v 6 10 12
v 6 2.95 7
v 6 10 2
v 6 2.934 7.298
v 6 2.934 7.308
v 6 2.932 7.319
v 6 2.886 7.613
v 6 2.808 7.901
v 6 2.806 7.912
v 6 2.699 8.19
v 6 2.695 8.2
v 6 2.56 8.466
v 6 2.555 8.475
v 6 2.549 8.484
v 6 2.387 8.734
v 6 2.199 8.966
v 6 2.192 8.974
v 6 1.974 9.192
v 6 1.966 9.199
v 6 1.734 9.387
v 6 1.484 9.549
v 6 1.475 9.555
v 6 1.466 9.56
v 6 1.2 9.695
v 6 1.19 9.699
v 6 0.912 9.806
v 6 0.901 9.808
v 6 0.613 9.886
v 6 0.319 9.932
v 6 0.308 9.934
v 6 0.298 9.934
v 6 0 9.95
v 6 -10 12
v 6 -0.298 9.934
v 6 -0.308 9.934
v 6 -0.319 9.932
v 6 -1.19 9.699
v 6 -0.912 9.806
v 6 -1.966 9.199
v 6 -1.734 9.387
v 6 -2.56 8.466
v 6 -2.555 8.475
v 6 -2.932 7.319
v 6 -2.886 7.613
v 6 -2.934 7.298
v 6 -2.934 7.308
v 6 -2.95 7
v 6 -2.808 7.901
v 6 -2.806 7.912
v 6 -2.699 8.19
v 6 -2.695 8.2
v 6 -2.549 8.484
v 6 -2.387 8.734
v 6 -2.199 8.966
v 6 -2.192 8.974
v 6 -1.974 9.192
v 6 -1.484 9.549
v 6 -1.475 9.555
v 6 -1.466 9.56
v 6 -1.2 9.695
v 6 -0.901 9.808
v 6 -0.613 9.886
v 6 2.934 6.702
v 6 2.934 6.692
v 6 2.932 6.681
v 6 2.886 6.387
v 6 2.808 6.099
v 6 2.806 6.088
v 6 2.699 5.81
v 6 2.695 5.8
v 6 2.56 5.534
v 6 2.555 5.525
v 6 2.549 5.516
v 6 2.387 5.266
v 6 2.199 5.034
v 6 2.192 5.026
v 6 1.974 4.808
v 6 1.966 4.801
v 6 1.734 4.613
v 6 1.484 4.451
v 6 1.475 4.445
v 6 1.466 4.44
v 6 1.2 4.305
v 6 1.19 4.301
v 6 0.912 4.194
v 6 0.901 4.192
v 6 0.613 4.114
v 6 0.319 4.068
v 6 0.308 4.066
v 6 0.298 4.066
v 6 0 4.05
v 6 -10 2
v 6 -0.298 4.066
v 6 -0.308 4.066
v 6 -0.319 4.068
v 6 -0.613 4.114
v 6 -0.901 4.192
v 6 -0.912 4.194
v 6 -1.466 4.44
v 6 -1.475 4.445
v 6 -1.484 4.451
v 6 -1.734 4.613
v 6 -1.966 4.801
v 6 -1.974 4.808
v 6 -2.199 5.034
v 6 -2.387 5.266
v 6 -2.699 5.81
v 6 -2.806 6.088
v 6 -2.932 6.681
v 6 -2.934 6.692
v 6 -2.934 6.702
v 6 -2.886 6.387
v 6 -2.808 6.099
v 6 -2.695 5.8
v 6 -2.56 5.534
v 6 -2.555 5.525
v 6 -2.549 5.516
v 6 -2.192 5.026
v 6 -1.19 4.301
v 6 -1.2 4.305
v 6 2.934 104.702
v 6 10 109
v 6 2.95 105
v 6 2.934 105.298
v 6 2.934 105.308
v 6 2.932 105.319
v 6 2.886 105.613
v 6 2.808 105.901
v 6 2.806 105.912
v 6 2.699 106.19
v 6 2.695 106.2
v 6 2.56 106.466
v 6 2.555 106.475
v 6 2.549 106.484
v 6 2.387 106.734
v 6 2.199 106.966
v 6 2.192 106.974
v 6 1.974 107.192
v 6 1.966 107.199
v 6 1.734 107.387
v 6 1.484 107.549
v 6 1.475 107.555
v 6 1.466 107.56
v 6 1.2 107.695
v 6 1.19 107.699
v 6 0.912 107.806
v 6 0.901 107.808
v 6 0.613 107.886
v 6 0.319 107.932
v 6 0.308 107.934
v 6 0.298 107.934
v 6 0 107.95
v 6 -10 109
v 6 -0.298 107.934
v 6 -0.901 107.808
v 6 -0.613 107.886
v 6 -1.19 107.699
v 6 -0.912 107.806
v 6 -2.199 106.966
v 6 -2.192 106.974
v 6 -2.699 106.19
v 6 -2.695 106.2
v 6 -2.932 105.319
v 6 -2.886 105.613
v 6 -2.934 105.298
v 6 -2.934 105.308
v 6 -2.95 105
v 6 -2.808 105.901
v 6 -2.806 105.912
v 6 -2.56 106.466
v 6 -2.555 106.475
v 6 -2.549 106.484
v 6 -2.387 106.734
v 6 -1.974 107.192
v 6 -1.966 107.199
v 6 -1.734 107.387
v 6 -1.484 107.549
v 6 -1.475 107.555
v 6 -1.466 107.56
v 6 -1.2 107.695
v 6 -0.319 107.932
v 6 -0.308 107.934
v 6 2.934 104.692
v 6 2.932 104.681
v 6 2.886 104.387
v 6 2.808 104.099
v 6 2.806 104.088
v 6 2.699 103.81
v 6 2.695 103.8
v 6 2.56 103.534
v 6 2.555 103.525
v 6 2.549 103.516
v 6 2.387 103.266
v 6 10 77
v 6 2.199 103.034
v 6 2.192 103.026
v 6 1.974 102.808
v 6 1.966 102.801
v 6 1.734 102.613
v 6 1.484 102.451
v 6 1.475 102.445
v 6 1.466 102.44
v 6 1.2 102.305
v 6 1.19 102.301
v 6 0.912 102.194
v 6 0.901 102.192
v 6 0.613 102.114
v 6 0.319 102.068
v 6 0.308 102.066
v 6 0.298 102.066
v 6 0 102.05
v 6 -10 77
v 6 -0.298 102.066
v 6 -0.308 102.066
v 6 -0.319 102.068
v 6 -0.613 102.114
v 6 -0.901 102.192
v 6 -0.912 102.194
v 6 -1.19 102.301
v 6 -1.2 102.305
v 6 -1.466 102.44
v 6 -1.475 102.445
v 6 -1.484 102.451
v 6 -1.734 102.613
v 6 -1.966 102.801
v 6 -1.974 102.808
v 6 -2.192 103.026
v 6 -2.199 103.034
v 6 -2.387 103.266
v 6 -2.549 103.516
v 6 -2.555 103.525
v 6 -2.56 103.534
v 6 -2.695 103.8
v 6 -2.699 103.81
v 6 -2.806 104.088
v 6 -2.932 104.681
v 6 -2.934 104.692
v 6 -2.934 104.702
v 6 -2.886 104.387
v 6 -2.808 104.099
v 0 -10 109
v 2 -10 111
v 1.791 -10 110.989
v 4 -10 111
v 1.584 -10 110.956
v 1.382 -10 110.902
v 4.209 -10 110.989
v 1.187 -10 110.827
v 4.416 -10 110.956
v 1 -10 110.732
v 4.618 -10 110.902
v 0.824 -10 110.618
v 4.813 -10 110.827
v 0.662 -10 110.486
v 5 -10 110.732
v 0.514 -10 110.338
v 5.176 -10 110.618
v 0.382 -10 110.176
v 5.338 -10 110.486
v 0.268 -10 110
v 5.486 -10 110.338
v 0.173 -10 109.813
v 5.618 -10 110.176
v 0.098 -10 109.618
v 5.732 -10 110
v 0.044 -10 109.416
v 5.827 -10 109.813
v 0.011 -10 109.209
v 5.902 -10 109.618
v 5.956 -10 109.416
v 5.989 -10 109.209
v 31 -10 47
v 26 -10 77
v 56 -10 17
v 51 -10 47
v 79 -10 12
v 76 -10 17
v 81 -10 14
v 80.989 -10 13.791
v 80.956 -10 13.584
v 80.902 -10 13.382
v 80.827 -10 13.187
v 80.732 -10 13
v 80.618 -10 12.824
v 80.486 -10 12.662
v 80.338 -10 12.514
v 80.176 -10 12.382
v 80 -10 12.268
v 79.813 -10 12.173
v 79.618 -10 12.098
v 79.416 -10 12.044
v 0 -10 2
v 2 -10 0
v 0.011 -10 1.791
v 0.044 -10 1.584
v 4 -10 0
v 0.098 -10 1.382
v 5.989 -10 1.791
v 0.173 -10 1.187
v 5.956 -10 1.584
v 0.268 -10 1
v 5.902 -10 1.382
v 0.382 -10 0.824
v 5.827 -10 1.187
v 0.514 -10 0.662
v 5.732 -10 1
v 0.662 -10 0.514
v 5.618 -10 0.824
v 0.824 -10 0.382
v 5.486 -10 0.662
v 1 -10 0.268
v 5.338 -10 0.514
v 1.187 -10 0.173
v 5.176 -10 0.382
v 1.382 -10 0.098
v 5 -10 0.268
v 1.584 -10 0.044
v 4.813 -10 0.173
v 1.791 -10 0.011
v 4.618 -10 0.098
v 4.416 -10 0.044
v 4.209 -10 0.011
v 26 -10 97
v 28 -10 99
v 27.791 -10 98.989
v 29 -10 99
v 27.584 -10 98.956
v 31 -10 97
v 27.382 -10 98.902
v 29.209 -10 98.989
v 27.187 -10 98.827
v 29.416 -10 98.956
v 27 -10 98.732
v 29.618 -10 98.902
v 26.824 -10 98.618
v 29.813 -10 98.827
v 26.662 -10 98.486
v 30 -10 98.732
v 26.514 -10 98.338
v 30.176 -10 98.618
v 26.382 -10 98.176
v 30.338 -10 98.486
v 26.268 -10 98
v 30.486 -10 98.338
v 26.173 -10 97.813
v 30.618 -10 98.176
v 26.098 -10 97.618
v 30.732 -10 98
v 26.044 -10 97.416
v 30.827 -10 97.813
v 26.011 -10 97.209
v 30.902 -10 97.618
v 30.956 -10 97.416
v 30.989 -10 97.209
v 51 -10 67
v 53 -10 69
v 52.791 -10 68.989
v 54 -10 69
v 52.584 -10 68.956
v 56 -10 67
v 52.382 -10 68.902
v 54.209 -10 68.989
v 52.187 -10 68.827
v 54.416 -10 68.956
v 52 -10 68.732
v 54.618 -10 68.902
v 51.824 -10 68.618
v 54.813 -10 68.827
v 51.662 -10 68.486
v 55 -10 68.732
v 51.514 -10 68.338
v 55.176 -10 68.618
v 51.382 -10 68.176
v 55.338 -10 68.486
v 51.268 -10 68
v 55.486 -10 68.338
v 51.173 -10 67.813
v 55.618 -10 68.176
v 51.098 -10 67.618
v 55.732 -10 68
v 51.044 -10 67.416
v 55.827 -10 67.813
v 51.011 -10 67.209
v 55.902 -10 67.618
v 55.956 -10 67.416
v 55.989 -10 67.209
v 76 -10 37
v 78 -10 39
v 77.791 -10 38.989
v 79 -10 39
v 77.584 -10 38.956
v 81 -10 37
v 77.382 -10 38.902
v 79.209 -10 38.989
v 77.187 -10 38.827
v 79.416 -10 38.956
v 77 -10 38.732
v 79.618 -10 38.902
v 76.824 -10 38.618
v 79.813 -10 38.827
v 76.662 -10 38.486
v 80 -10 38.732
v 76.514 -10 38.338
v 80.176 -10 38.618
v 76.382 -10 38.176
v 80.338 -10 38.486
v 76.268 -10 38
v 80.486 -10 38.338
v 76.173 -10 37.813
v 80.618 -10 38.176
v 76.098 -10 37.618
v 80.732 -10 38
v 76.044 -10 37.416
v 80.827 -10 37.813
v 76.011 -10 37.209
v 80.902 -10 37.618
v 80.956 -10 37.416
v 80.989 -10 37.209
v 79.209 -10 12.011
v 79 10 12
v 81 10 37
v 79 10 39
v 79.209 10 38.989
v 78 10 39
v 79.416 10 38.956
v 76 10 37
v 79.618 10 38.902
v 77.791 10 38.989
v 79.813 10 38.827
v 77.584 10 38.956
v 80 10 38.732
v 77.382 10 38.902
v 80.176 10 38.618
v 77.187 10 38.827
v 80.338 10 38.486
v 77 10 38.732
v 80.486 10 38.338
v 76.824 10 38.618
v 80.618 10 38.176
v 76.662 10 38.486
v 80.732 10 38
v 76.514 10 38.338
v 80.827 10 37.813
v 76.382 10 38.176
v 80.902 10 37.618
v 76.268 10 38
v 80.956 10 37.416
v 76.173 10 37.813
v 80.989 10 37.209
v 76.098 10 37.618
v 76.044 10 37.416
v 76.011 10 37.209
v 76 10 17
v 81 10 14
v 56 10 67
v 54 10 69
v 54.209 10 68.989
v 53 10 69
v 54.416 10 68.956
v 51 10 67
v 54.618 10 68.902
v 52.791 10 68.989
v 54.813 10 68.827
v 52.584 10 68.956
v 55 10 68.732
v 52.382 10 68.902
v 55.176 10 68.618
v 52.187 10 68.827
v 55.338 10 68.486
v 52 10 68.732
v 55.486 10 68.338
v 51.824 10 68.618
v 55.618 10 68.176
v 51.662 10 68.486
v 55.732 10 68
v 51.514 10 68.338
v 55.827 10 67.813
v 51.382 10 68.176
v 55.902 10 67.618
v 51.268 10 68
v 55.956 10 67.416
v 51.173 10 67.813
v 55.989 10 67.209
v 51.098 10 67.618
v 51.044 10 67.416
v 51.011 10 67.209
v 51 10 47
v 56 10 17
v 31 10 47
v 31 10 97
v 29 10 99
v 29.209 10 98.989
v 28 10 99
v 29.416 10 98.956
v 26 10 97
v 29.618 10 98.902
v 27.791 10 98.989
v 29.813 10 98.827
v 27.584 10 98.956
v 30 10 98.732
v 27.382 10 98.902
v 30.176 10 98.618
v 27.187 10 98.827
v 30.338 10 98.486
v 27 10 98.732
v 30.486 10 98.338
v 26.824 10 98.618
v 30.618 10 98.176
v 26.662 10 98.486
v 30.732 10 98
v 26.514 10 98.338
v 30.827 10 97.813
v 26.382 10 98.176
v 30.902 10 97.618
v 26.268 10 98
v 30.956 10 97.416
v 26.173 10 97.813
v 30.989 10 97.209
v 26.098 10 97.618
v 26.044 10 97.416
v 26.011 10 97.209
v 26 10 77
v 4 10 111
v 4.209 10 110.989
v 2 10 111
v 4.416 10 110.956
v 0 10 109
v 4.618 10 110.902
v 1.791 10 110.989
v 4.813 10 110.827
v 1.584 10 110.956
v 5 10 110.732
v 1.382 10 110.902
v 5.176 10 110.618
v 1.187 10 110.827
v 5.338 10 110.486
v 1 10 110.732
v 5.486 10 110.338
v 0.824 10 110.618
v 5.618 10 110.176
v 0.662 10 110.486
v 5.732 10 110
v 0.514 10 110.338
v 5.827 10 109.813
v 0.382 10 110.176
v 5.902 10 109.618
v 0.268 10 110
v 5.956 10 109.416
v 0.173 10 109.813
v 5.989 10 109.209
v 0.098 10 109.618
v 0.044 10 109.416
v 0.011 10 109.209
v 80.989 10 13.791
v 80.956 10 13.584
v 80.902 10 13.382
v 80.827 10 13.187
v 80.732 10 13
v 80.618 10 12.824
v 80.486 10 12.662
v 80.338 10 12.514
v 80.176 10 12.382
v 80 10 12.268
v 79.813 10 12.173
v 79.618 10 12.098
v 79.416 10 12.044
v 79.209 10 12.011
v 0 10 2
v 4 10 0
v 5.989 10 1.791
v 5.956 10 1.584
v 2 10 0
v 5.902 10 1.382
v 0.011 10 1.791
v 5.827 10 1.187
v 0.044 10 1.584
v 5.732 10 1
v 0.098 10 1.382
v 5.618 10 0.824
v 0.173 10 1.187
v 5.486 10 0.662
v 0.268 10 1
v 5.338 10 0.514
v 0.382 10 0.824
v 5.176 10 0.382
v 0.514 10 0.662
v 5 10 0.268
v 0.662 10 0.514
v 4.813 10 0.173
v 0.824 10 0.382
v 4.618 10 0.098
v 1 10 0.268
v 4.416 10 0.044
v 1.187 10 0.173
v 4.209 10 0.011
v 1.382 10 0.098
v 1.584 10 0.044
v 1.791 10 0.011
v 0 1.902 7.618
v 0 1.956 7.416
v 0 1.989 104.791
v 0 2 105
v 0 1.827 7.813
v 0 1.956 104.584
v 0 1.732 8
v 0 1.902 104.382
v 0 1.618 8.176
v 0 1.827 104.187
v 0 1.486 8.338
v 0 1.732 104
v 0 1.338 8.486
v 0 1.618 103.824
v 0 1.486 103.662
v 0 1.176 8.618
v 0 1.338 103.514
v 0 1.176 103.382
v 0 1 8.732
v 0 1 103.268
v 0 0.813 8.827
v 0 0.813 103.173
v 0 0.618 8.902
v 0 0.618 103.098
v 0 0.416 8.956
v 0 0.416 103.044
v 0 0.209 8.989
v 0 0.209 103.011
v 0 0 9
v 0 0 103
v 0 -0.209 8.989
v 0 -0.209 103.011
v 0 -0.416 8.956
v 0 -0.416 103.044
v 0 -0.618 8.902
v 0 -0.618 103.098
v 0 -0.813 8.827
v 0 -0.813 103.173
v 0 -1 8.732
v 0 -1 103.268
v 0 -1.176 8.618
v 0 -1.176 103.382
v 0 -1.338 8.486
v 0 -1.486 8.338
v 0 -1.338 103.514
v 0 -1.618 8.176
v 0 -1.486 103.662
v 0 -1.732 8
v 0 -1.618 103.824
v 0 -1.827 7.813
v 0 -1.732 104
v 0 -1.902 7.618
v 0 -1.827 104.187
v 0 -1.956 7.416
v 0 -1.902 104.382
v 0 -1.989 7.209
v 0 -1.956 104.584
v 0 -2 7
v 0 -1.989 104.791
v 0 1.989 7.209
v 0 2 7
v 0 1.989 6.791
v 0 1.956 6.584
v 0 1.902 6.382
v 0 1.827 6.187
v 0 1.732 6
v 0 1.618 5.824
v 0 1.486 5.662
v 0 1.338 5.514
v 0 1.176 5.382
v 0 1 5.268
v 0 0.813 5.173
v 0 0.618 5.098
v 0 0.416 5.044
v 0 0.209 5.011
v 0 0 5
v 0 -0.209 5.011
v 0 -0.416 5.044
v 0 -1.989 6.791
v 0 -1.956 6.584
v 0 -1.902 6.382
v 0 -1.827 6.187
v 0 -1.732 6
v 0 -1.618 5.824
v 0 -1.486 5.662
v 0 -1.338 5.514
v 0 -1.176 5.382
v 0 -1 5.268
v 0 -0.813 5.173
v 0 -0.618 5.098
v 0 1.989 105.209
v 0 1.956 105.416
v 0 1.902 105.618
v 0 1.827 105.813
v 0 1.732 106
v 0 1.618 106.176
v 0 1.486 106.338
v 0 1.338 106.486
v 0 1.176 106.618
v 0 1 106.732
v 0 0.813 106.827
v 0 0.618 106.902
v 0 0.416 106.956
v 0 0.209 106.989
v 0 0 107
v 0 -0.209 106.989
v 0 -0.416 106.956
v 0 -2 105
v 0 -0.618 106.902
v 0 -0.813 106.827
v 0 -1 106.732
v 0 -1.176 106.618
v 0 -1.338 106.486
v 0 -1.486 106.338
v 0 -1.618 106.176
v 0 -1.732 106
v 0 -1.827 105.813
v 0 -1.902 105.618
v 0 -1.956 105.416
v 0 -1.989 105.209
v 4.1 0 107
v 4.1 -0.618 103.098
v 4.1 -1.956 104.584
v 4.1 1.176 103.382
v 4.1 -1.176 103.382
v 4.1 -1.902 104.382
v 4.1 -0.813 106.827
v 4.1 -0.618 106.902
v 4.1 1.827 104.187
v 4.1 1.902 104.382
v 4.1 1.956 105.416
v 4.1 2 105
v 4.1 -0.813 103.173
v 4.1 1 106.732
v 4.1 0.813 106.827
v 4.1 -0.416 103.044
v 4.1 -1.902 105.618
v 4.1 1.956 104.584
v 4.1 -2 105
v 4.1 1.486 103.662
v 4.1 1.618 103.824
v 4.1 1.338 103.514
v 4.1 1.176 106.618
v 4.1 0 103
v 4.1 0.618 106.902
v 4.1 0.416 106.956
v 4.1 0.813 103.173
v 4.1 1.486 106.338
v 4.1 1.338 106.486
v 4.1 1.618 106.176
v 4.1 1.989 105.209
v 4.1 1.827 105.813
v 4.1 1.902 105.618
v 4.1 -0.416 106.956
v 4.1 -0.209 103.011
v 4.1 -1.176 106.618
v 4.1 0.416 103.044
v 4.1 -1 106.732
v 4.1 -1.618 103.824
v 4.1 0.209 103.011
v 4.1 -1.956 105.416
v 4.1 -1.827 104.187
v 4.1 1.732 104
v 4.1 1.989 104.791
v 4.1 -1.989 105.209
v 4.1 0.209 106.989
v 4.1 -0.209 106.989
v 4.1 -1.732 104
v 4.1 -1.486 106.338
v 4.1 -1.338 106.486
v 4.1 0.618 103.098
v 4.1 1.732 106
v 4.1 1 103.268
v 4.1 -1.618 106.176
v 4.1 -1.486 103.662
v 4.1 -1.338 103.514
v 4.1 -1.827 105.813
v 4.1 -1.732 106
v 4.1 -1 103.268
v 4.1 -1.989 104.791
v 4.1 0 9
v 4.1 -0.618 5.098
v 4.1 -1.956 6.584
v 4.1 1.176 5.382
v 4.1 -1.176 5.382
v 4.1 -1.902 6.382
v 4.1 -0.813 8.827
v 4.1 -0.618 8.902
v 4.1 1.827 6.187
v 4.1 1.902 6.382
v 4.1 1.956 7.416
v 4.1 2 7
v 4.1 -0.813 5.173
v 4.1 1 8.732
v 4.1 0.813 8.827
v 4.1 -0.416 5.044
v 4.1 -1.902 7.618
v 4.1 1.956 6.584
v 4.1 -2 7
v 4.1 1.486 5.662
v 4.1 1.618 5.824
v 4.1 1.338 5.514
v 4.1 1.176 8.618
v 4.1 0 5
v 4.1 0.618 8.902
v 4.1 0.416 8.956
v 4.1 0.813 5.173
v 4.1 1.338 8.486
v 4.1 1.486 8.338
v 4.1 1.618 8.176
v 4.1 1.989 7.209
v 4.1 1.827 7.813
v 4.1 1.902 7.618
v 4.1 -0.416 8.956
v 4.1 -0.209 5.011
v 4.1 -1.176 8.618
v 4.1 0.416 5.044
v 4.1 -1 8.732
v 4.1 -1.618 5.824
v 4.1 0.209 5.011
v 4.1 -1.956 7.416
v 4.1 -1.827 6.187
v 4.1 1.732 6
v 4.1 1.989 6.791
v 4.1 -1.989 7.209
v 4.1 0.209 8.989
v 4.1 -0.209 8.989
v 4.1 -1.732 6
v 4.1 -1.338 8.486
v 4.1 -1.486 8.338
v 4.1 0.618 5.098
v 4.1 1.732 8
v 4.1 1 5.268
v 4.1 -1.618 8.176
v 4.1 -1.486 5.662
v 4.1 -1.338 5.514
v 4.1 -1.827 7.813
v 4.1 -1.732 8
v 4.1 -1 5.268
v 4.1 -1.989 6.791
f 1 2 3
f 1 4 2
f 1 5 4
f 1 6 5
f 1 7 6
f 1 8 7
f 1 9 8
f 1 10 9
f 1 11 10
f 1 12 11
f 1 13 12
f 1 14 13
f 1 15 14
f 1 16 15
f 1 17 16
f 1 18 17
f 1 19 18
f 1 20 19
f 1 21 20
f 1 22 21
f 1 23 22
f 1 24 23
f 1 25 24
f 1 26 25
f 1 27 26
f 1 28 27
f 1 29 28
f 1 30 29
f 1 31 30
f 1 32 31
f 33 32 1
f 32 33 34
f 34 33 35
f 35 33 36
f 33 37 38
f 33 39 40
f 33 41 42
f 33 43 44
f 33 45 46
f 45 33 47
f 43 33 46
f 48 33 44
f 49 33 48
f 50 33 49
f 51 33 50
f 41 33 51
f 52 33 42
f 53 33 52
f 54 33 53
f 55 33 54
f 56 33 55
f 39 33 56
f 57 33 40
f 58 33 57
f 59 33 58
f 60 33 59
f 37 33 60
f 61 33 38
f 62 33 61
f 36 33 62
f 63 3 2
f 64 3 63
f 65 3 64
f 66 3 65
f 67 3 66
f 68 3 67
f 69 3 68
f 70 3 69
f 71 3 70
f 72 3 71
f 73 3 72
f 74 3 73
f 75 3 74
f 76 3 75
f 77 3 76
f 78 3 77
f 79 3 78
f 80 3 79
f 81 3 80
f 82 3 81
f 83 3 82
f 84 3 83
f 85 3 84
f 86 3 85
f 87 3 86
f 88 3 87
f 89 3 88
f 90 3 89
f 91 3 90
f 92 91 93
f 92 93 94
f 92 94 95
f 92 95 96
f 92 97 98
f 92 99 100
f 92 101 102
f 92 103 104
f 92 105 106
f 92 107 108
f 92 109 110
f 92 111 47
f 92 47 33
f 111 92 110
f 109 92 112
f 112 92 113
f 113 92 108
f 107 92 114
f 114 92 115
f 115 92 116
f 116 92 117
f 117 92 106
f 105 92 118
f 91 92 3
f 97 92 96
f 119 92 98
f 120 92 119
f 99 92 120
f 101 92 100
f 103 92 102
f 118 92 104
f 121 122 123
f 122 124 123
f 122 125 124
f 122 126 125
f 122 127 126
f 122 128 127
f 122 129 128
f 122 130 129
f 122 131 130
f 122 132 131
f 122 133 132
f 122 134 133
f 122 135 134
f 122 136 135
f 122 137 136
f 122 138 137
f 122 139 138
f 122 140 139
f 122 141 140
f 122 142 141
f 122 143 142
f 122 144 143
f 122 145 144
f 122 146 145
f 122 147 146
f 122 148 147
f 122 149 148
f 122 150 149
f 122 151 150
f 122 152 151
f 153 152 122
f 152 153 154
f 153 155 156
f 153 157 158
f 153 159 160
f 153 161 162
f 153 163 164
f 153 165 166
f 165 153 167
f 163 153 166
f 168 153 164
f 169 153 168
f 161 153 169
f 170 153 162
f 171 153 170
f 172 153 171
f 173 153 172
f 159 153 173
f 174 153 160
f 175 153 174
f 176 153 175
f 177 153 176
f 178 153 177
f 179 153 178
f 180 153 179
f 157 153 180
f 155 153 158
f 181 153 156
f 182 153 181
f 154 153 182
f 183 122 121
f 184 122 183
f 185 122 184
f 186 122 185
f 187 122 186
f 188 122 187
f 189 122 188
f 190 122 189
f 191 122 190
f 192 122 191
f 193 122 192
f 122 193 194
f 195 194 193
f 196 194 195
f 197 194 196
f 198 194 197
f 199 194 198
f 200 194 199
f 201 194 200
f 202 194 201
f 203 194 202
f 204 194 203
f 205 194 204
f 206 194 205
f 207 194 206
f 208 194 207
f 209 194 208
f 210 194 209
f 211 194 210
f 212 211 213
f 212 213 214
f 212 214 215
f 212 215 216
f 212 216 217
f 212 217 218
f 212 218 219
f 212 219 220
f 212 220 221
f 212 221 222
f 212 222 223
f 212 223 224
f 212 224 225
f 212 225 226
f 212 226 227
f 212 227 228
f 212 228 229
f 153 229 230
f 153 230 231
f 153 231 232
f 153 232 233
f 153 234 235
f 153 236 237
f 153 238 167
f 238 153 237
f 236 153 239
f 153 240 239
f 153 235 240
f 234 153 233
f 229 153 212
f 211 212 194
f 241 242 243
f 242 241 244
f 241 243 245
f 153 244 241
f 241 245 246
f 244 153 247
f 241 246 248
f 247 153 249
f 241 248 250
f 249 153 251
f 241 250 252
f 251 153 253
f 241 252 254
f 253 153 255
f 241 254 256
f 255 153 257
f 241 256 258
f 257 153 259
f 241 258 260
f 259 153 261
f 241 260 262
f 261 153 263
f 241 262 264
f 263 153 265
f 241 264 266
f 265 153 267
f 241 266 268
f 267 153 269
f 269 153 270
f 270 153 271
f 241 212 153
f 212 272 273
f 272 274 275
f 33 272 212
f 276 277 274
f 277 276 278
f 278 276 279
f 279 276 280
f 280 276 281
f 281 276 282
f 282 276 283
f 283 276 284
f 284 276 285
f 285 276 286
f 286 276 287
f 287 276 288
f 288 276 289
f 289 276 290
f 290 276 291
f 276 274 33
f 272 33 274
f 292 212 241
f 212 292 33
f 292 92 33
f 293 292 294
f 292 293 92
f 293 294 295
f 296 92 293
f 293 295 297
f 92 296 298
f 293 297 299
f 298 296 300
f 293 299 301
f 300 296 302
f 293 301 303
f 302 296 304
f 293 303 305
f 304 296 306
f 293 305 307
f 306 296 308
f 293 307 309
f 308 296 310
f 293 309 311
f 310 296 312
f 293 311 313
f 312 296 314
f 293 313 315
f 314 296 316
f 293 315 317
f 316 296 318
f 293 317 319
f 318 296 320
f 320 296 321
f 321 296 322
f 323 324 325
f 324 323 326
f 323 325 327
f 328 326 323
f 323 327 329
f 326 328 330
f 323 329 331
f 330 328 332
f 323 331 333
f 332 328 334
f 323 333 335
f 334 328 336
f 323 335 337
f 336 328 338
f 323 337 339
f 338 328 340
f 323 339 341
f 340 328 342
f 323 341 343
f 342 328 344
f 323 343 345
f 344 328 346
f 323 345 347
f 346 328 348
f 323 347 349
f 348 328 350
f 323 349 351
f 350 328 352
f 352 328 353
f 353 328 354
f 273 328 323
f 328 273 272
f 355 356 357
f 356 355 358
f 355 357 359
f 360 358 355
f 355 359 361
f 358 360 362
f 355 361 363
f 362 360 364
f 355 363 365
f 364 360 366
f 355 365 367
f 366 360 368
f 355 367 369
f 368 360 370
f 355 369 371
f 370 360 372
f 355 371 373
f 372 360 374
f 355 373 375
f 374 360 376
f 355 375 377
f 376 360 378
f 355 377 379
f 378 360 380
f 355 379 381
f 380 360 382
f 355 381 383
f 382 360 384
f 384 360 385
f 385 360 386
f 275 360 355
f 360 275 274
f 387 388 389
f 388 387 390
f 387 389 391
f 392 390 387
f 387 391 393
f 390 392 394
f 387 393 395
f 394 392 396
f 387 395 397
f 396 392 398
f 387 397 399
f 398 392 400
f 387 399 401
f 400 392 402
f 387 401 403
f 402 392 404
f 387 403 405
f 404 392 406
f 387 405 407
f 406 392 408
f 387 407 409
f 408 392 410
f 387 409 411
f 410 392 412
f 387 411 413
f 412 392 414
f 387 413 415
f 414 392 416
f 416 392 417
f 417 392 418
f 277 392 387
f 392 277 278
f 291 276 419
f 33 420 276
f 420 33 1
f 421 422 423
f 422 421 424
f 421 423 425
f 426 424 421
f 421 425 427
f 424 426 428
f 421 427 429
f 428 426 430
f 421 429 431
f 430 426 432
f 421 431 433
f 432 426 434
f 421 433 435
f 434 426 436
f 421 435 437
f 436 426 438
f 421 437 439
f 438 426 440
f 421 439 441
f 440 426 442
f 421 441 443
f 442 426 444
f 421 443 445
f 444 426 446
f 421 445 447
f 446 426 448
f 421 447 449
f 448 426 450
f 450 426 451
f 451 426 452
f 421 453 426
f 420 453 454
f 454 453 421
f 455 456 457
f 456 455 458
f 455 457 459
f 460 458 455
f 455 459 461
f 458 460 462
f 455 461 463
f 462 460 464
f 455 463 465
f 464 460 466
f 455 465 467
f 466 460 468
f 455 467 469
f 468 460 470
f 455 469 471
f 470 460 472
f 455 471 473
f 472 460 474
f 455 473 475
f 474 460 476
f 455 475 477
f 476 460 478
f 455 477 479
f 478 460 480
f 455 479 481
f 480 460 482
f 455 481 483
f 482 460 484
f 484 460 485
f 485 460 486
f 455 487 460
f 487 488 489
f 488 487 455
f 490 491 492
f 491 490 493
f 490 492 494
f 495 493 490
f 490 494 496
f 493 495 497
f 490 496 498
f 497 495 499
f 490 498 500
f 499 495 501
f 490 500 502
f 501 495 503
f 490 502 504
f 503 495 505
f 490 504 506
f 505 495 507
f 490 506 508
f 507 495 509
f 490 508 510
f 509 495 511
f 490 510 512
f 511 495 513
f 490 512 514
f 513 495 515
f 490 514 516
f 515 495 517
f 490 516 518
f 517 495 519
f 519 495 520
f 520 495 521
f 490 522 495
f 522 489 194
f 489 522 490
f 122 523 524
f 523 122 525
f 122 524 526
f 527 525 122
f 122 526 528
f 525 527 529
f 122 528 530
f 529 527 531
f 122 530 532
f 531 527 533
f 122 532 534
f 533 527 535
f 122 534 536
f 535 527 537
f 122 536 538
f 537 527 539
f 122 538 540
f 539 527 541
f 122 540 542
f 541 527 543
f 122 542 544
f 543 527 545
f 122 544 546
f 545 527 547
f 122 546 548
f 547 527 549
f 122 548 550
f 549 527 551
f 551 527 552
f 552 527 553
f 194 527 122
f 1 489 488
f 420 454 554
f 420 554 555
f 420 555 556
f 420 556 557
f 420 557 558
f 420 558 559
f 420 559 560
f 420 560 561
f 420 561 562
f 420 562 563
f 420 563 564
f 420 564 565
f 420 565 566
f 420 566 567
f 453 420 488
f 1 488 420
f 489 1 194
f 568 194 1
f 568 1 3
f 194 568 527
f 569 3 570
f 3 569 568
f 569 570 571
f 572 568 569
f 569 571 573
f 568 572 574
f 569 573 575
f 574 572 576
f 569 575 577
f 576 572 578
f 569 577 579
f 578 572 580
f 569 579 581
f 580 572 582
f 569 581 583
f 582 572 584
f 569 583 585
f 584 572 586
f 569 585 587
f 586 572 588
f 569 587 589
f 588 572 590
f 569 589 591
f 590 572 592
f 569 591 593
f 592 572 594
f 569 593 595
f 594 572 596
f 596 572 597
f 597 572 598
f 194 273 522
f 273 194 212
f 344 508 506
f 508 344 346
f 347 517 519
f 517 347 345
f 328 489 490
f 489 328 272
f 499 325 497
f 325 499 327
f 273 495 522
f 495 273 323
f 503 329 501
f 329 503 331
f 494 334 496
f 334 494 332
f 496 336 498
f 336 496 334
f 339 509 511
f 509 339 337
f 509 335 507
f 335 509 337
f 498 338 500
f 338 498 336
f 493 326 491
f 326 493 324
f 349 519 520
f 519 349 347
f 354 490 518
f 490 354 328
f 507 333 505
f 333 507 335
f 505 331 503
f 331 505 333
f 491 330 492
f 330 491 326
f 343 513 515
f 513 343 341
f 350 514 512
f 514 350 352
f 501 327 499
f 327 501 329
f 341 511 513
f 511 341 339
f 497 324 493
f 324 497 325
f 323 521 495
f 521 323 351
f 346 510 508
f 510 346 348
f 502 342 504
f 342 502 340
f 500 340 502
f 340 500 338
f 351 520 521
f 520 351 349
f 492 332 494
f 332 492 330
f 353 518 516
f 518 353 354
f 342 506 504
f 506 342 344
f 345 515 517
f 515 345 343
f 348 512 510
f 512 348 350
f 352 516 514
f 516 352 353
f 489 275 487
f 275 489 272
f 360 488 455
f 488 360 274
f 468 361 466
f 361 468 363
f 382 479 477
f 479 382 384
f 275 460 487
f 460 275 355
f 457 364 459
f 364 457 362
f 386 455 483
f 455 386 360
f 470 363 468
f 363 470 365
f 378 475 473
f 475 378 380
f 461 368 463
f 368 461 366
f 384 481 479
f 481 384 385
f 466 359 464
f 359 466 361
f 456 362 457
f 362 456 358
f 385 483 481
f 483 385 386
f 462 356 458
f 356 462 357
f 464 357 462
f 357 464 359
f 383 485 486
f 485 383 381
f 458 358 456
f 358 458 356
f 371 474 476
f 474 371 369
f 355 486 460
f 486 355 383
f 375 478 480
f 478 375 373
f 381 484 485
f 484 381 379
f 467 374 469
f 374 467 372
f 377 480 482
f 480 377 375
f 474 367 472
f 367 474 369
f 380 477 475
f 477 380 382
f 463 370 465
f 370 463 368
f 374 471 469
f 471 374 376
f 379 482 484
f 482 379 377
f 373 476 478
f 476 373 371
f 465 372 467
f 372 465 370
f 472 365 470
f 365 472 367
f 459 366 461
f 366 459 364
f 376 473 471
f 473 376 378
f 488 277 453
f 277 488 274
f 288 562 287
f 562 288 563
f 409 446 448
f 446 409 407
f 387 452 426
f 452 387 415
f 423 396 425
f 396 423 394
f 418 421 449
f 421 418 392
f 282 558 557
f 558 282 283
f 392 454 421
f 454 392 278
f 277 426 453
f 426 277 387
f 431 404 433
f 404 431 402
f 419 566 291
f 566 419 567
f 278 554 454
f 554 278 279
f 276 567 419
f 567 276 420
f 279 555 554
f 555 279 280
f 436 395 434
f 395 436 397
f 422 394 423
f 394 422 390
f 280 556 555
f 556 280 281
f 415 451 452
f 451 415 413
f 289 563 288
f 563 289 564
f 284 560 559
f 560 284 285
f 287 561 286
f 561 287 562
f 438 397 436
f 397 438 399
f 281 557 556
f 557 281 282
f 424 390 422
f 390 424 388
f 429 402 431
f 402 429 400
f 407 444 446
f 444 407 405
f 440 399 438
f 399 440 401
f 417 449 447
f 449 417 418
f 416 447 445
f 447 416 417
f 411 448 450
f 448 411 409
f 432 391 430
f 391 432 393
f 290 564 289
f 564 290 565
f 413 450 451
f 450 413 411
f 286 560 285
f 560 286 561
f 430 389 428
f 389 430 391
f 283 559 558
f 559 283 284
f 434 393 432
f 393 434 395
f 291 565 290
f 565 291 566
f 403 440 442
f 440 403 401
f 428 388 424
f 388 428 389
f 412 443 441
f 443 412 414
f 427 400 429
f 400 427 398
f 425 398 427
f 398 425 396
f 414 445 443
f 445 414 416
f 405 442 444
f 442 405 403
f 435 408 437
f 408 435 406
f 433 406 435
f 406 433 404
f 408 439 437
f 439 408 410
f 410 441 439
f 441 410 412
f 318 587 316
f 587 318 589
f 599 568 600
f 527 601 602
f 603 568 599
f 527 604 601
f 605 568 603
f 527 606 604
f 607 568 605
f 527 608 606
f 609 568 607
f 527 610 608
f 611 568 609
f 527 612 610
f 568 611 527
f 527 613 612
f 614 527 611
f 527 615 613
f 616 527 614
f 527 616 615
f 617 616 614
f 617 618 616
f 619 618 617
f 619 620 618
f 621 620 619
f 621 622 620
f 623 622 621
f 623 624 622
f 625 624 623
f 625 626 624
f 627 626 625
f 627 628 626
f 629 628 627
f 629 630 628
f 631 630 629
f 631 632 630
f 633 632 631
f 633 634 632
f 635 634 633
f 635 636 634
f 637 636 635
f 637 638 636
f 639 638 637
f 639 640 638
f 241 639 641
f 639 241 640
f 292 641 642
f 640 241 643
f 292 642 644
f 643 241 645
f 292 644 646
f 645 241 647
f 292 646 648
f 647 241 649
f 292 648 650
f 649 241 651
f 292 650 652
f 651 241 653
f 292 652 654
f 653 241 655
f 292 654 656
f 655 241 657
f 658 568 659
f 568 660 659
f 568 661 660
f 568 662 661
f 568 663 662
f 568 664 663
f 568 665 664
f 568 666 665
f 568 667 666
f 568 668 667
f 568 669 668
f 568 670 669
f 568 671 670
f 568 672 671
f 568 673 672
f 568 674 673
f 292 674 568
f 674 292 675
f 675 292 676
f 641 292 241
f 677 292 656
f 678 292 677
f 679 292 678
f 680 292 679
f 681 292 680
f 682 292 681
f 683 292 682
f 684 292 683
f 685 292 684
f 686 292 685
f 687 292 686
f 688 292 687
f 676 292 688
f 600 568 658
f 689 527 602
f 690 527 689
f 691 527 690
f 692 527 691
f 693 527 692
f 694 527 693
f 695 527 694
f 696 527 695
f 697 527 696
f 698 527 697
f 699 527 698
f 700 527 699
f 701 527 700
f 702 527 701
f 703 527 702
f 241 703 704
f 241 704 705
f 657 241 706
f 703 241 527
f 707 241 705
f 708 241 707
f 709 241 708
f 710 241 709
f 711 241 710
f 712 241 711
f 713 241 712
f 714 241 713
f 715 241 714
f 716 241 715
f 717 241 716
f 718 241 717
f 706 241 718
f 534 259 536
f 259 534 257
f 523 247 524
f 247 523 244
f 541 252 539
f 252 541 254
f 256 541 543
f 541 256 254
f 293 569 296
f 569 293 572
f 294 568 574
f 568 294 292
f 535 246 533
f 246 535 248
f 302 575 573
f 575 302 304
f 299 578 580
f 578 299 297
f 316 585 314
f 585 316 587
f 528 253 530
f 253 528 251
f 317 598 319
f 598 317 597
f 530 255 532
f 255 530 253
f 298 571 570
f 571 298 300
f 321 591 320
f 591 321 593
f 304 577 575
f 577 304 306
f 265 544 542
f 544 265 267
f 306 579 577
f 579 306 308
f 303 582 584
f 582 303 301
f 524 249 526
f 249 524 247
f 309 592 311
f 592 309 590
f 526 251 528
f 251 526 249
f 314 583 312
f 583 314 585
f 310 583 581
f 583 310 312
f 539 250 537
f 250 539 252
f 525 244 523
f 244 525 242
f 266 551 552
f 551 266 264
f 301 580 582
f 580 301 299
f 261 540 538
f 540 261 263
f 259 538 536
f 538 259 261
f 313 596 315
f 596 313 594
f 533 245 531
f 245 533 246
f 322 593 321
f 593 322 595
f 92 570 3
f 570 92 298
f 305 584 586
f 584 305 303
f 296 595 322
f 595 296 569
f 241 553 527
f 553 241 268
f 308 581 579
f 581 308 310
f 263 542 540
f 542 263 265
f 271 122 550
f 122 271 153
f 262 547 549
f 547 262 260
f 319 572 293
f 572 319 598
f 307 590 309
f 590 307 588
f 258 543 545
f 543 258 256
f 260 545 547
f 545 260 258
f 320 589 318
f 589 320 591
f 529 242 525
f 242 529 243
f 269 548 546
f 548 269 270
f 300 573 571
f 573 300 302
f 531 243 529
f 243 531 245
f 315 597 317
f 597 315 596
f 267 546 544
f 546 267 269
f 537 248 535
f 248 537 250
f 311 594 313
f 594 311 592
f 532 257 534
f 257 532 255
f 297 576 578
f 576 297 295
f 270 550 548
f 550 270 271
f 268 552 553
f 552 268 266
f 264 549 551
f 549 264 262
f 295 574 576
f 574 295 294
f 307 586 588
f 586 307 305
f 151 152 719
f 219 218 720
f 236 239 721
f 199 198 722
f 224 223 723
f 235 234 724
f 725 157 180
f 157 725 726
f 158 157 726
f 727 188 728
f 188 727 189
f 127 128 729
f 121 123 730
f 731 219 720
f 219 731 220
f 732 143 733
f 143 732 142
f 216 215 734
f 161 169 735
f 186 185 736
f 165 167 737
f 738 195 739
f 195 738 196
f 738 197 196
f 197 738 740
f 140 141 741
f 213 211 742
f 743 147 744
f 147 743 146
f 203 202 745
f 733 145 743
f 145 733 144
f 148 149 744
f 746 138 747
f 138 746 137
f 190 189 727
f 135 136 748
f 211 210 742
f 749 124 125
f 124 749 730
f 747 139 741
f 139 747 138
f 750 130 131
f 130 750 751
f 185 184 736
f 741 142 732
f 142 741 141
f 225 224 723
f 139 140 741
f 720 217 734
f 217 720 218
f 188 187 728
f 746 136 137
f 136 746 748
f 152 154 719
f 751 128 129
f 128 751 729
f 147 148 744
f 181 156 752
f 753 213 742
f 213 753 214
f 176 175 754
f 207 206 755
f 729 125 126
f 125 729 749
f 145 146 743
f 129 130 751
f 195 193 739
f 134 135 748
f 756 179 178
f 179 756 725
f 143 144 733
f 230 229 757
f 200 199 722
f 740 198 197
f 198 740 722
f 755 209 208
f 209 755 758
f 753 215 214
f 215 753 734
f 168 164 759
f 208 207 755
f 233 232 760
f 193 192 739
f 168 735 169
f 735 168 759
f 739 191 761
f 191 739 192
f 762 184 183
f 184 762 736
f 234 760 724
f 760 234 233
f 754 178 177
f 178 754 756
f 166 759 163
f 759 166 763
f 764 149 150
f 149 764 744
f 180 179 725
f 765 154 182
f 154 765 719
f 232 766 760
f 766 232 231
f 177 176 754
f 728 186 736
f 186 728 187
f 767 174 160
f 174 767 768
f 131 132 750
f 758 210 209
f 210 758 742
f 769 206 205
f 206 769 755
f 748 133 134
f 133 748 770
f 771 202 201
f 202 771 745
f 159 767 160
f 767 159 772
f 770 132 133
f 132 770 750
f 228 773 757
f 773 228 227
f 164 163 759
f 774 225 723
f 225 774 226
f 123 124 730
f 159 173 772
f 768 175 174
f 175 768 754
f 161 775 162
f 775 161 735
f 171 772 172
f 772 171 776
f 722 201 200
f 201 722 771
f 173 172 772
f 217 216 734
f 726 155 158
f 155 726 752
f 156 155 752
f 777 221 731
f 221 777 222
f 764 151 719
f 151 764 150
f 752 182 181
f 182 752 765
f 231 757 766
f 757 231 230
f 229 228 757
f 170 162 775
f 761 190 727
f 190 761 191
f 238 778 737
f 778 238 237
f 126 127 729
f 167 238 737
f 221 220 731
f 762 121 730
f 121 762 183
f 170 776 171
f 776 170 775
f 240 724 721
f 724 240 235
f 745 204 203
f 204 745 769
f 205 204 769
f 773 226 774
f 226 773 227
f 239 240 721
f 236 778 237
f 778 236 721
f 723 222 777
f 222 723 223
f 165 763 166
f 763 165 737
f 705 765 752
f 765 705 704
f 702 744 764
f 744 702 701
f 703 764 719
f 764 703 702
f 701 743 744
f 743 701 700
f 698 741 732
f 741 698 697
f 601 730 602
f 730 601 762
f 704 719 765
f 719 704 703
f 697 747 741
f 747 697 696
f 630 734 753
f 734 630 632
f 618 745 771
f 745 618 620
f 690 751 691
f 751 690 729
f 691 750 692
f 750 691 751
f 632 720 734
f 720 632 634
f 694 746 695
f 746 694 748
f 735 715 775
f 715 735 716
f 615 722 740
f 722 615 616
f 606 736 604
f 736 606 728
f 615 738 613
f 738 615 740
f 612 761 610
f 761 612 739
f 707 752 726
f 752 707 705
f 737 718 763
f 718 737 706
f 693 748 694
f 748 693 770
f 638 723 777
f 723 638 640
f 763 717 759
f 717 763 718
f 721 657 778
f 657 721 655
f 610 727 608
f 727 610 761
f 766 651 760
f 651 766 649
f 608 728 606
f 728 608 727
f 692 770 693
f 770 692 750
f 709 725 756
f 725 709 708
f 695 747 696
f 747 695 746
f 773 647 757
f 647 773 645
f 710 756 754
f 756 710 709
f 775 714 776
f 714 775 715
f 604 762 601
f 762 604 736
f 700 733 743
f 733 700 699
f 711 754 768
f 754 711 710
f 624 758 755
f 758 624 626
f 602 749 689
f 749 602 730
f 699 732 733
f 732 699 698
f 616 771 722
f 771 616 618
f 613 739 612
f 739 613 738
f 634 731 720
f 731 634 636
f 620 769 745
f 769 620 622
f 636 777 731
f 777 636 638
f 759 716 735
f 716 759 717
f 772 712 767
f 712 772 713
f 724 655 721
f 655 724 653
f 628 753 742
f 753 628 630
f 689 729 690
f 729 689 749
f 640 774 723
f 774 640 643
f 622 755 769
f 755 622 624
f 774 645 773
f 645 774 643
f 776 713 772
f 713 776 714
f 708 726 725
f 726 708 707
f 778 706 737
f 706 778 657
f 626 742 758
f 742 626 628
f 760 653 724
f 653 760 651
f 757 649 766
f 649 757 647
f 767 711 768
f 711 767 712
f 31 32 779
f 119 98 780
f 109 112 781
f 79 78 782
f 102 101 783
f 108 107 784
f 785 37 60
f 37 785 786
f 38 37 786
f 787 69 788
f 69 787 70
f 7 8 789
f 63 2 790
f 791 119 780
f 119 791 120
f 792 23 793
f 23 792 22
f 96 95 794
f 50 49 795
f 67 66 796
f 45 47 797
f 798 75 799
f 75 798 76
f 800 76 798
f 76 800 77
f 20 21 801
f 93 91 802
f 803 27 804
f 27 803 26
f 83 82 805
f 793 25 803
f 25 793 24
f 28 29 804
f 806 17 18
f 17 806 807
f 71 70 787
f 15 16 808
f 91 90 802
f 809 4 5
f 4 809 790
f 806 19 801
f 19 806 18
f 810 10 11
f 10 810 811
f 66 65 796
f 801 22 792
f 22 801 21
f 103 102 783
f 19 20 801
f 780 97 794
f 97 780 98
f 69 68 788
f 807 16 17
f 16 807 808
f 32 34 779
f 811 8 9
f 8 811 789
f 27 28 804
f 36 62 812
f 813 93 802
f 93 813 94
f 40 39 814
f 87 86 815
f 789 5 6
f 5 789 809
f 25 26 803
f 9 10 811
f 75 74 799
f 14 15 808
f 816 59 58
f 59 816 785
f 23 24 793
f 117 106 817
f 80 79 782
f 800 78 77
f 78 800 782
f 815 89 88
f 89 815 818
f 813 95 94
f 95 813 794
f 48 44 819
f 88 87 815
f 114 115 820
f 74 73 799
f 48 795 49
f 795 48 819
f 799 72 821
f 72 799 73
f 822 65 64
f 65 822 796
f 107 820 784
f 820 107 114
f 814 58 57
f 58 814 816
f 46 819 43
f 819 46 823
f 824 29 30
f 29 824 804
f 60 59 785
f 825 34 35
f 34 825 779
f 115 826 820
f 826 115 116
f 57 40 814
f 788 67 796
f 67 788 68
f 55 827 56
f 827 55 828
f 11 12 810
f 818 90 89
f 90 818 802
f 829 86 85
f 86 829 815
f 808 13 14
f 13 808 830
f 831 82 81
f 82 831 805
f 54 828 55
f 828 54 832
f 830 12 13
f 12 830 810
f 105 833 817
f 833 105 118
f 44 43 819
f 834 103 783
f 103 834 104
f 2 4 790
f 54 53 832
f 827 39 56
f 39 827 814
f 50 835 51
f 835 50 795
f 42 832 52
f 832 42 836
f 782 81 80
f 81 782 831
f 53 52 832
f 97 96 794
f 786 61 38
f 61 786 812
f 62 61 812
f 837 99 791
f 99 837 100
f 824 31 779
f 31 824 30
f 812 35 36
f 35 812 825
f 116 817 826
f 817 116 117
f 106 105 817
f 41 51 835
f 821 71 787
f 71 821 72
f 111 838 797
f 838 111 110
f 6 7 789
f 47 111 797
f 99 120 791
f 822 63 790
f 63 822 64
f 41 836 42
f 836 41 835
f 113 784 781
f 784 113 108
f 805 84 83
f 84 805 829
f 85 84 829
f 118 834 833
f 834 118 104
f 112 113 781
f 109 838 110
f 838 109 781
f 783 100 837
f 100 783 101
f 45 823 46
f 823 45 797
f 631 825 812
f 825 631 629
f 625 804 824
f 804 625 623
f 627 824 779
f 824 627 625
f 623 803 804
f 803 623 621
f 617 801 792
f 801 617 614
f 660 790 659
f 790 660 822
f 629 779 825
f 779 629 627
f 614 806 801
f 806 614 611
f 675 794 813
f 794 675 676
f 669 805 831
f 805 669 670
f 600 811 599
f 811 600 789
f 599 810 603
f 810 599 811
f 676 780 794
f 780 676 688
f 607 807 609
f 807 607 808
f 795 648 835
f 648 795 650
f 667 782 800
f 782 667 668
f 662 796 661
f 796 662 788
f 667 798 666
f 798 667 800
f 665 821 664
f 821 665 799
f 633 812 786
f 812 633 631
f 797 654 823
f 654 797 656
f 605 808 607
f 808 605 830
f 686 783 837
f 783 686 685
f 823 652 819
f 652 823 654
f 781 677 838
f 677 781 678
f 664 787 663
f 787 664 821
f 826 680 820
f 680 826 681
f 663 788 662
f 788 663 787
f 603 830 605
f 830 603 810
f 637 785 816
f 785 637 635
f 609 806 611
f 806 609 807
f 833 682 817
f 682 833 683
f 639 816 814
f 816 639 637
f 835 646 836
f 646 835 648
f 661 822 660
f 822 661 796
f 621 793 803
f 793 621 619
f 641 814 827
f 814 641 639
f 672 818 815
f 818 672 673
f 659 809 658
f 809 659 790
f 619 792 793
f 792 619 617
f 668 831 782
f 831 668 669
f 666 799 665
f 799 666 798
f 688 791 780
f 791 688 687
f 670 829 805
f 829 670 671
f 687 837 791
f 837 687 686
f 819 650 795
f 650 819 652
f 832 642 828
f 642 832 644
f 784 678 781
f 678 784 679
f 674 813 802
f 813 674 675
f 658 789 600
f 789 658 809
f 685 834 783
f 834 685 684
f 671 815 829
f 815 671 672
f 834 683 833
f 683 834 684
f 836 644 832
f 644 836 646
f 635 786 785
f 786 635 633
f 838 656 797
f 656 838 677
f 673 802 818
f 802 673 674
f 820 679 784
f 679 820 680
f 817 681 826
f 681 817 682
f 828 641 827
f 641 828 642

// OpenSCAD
// Number of sticks to hold
numSticks = 3; // [1:10]

// Stick width
stickWidth = 20; // [1:40]

// Stick height
stickHeight = 20; // [1:40]

// Vertical spacing between sticks
heightDiff = 30; // [10:50]

// Number of drills for the support
numberDrills = 2; // [1, 2]

// Drills diameter
drillDiameter = 4; // [3:8]


/* [Hidden] */

drillWidth = drillDiameter/2;
oDepth = 20;

// Less or equall than support width
wD = 5; // [4:50] 

wSWidth = 6; // [4:50]
wallWidth = min(wSWidth, wD); 


totalSupportHeight = stickHeight + heightDiff * (numSticks - 1) + wallWidth + numberDrills * (drillWidth + 10);

drillShift = (numberDrills - 1) * (drillWidth + 10);


$fn=60;
rad = 2;
difference() {
union(){
wallSupport();
translate([wSWidth-wallWidth >=0 ?  wSWidth-wallWidth : 0, 0, drillShift])
sticksHolder();
}
union() {
translate([wSWidth+0.1, 0, totalSupportHeight-drillWidth-2])
    rotate(a=[0, -90, 0])    
drill(drillWidth, wSWidth+1, 1);

if (numberDrills == 2) {
translate([wSWidth+0.1, 0, 7])
    rotate(a=[0, -90, 0])    
drill(drillWidth, wSWidth+1, 1);
}
}
}

module wallSupport() {
dr = numberDrills * (drillWidth + 10);
translate([0, -oDepth/2, 0])
roundedCube(wSWidth, oDepth, totalSupportHeight, rad);
}

module drill(r, h, chanfer) {
cylinder (r=chanfer+r, h=r, r2=r);  
translate([0, 0, chanfer]) cylinder(r=r, h=h-chanfer); 

}

module sticksHolder() {
    w = 2*wallWidth + stickWidth;
    for (a = [1:numSticks]) {
        translate([(a-1)*(w-wallWidth), -oDepth/2, 0])
        //translate([(a-1)*(w-wallWidth), -oDepth/2, -(a-1)*heightDiff])
                stickHolder(stickWidth, oDepth, stickHeight, numSticks-a);
          
    }
}


module stickHolder(w, d, h, last) {
r=rad;
s = last > 0 ? 1 : 0;
tW = w+2*wallWidth;
tH = h+wallWidth + heightDiff * last;
    roundedCube(wallWidth, d, tH, r);
    translate([wallWidth-r, 0, 0]) cube([w+2*r, d, tH-h]);
    translate([wallWidth+w, 0, 0]) roundedCube(wallWidth, d, tH, r);
}

module roundedCube(w, d, h, r) {
hull() {
translate([r, 0, r]) rotate(a=[-90, 0, 0]) cylinder(r=r, h=d);
translate([w-r, 0, r]) rotate(a=[-90, 0, 0]) cylinder(r=r, h=d);
translate([r, 0, h]) rotate(a=[-90, 0, 0]) cylinder(r=r, h=d);
translate([w-r, 0, h]) rotate(a=[-90, 0, 0]) cylinder(r=r, h=d);    
}
}
